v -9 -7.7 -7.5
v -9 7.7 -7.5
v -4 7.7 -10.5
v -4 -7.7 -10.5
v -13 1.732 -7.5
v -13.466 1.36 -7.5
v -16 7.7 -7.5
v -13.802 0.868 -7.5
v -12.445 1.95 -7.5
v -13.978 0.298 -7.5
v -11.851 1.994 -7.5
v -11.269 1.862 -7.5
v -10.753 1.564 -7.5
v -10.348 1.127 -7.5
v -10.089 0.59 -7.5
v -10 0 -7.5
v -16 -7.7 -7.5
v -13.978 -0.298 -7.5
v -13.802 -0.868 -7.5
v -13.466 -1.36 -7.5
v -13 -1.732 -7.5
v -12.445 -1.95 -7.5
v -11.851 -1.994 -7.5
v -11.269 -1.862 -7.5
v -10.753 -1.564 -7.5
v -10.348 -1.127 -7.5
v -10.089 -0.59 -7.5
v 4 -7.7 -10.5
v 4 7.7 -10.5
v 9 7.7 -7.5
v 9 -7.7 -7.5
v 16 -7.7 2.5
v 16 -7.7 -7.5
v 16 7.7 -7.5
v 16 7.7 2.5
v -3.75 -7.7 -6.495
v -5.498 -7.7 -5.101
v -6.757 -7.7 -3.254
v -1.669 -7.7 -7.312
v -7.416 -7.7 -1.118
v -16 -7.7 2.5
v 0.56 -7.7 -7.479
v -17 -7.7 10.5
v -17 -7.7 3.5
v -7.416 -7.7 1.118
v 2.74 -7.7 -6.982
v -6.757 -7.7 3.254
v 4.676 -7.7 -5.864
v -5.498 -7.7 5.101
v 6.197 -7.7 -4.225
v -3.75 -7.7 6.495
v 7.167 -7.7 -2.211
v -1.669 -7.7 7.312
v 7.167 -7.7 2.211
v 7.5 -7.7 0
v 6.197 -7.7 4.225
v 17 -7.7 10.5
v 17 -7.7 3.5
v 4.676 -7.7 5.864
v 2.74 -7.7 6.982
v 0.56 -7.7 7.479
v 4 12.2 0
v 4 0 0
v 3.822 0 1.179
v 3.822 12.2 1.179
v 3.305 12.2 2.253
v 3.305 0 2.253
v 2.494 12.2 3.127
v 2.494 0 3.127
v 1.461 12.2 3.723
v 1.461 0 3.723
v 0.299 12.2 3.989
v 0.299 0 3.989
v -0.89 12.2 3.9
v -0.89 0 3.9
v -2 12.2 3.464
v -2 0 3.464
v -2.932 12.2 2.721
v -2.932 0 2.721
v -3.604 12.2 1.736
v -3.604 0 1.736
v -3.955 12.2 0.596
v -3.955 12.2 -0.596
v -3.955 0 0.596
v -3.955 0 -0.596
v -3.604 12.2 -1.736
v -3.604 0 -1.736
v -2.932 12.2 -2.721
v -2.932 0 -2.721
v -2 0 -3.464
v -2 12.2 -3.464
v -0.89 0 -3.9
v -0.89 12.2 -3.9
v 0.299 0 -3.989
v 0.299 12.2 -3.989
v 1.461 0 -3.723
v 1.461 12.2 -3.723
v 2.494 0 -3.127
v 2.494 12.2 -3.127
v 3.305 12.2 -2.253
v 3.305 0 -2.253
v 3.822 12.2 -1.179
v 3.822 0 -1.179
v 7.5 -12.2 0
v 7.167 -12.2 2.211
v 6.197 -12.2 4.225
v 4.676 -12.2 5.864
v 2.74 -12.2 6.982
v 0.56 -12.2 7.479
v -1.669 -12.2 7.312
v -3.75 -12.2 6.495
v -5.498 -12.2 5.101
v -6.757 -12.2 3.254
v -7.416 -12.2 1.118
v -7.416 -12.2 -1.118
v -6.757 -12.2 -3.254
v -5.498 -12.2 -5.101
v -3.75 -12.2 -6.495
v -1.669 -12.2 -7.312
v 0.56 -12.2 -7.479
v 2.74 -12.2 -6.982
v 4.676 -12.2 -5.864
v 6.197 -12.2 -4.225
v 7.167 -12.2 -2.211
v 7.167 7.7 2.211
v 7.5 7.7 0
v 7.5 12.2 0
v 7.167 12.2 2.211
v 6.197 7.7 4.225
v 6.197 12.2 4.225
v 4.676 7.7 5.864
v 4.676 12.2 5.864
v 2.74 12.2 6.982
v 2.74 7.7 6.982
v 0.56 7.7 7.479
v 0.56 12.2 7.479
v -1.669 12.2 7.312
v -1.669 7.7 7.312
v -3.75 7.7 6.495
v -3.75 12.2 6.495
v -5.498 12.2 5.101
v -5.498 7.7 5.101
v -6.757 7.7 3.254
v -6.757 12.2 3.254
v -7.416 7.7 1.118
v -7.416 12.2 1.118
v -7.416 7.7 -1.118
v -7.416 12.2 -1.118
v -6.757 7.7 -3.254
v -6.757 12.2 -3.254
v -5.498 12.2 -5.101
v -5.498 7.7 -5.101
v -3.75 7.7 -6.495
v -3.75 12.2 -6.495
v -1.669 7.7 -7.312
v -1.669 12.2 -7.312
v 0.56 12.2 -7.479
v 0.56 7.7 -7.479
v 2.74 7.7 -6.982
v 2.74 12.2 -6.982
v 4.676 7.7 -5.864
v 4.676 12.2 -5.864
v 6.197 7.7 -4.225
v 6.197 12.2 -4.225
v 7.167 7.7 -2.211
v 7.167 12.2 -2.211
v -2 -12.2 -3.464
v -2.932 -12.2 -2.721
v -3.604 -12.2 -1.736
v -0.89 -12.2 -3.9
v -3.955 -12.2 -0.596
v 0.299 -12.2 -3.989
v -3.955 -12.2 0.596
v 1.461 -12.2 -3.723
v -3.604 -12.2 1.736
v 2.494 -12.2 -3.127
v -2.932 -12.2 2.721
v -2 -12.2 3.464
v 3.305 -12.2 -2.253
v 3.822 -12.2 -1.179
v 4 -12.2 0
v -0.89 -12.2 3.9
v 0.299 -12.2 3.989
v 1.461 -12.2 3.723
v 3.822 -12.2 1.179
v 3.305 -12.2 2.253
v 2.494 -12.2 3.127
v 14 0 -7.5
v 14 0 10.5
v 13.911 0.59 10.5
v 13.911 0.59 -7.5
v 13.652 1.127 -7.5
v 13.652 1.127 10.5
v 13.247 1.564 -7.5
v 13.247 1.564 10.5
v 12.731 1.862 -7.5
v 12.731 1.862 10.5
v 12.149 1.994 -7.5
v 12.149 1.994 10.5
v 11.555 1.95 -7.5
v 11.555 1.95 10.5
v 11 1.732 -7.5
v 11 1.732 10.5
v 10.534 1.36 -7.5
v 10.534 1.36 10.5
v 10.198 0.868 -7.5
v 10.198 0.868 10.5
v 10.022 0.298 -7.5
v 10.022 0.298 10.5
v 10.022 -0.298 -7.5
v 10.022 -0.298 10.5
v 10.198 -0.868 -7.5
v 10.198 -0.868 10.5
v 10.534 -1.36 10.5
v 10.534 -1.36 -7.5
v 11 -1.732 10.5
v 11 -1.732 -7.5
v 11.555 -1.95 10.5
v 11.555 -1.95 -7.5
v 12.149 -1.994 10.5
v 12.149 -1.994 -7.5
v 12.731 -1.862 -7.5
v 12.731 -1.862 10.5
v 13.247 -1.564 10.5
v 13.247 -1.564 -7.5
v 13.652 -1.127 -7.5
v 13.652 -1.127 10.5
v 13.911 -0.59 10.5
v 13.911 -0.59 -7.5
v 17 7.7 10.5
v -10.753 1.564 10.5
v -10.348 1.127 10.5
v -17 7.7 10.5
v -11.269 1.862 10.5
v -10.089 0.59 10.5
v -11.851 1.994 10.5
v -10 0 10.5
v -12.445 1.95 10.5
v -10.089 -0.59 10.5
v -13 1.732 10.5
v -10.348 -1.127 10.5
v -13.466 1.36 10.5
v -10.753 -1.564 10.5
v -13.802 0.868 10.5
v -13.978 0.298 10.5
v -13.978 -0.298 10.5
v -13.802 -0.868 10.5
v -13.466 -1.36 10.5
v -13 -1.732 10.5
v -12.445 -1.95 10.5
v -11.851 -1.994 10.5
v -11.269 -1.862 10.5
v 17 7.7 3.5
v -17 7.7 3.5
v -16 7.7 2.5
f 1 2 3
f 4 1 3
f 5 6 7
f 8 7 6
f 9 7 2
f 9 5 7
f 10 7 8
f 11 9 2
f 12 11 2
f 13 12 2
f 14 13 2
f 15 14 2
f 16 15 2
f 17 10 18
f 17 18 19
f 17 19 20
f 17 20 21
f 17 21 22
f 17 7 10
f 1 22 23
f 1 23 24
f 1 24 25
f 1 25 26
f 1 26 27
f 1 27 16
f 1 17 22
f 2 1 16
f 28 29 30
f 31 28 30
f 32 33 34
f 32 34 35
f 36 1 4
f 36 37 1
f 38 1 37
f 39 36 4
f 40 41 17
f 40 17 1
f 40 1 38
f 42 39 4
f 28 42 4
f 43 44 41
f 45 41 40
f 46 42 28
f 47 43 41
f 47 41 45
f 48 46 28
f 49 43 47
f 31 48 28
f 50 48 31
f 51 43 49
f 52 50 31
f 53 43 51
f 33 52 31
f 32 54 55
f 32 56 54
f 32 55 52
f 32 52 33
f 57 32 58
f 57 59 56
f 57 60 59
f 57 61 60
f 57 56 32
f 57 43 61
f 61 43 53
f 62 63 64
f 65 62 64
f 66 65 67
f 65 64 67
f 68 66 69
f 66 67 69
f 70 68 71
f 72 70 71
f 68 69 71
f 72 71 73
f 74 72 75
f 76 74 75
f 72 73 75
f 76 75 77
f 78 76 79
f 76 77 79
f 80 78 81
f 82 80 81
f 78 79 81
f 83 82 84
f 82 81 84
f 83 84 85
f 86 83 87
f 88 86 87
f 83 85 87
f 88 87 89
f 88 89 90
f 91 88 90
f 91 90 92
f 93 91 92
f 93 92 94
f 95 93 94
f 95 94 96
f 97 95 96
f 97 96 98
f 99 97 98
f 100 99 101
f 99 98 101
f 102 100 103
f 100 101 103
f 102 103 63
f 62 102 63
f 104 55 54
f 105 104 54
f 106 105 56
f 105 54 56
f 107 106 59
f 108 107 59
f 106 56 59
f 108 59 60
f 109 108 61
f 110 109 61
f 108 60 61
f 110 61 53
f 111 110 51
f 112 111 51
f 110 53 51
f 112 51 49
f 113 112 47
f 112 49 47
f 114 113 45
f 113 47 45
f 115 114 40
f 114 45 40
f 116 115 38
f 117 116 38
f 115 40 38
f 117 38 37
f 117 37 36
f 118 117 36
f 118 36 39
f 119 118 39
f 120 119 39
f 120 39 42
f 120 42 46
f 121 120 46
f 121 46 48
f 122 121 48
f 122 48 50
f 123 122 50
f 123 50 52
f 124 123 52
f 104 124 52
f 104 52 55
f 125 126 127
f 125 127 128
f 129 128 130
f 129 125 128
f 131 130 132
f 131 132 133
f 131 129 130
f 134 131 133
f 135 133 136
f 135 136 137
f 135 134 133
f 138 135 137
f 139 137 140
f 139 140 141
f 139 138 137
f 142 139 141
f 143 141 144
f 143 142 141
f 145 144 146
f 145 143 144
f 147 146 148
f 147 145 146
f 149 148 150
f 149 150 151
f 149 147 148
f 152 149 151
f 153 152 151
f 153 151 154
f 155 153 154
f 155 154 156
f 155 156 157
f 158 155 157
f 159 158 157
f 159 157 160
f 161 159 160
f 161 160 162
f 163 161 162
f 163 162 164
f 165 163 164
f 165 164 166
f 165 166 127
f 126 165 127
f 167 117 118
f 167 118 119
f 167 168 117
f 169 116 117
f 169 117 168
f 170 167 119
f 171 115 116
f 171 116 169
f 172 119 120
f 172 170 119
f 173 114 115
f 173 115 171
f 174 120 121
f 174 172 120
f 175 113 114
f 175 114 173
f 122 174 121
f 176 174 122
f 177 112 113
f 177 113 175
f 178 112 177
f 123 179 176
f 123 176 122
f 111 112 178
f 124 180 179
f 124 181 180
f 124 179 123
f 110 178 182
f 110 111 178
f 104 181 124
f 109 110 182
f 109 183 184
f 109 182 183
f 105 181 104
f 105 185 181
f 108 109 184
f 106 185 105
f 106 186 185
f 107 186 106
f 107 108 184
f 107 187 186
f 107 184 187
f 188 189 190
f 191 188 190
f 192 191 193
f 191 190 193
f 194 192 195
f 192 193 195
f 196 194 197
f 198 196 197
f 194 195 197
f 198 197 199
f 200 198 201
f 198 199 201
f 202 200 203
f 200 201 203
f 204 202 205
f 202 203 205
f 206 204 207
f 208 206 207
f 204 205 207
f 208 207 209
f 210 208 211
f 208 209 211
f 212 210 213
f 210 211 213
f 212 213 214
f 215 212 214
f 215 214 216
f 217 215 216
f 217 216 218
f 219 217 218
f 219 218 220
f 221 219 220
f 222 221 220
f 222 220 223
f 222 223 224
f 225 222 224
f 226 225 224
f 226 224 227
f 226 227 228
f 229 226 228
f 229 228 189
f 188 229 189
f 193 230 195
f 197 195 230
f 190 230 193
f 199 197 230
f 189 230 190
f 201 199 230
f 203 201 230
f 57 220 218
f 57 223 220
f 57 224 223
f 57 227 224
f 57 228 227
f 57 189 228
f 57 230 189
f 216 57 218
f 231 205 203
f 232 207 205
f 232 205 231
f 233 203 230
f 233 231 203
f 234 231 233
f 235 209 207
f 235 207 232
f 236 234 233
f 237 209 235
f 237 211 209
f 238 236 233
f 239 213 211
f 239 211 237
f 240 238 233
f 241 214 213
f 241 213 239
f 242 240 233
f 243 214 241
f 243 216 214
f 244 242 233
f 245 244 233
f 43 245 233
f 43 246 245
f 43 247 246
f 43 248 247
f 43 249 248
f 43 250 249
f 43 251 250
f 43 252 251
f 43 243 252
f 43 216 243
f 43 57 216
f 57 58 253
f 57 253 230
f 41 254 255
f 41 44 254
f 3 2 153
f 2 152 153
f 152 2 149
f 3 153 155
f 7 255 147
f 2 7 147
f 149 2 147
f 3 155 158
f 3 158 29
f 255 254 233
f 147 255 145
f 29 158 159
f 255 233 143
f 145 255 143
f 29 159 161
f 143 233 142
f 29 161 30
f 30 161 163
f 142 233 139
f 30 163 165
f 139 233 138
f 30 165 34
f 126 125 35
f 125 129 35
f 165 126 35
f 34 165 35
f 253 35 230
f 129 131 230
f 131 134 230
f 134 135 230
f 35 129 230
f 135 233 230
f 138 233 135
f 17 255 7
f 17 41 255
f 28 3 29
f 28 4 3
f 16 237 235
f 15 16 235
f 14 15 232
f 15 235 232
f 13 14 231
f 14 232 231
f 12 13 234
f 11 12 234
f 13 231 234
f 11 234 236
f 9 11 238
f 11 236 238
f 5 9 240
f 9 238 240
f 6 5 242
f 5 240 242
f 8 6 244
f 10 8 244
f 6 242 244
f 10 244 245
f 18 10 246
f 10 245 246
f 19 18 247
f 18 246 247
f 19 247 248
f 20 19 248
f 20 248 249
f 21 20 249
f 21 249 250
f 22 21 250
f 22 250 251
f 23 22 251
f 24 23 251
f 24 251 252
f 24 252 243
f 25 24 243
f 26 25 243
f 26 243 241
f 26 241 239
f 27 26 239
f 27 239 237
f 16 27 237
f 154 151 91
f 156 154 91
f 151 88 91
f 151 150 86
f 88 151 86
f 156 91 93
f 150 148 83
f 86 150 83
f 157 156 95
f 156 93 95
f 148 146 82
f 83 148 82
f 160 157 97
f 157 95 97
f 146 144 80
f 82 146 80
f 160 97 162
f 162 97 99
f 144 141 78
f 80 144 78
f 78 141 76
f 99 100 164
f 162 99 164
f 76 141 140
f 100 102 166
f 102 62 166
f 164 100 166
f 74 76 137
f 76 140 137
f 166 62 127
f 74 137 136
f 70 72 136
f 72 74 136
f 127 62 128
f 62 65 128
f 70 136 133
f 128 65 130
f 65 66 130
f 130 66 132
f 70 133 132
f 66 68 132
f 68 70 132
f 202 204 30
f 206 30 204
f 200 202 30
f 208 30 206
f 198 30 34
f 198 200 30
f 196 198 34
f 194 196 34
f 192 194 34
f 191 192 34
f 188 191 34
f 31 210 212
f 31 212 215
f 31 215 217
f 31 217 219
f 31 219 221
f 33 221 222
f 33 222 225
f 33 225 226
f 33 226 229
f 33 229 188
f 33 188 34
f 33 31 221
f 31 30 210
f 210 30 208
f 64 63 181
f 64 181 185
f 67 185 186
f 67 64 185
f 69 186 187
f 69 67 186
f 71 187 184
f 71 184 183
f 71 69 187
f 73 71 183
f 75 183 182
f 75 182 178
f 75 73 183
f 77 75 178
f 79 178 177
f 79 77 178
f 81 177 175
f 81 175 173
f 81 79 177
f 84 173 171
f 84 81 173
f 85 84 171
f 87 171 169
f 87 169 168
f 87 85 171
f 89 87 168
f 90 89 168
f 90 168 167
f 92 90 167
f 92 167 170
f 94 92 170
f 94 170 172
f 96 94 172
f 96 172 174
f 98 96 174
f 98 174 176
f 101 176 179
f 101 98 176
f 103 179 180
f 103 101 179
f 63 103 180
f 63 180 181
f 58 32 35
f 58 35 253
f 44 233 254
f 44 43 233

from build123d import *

# Parameters (mm, degrees)
F0_R          = 7.5
F1_DEPTH      = 7.7
F1_DEPTH_BACK = 7.7
F2_R          = 2
F3_DEPTH      = 25
F4_R          = 7.5
F4_R_2        = 4
F5_DEPTH      = 12.2
F5_DEPTH_BACK = 12.2


with BuildPart() as f1:
    # F0 (on Front) → F1 (new body, two sides)
    with BuildSketch(Plane.XZ) as f1_sk:
        Polygon((-4, -10.5), (4, -10.5), (9, -7.5), (16, -7.5), (16, 2.5), (17, 3.5), (17, 10.5), (-17, 10.5), (-17, 3.5), (-16, 2.5), (-16, -7.5), (-9, -7.5), align=None)
        Circle(F0_R, mode=Mode.SUBTRACT)
    extrude(amount=F1_DEPTH)
    extrude(f1_sk.sketch, amount=-F1_DEPTH_BACK)

    # F2 (on face) → F3 (cut)
    with BuildSketch(Plane.XY.offset(10.5)):
        with Locations((-12, 0)):
            Circle(F2_R)
        with Locations((12, 0)):
            Circle(F2_R)
    extrude(amount=-F3_DEPTH, mode=Mode.SUBTRACT)

    # F4 (on Front) → F5 (join, two sides)
    with BuildSketch(Plane.XZ) as f5_sk:
        Circle(F4_R)
        Circle(F4_R_2, mode=Mode.SUBTRACT)
    extrude(amount=F5_DEPTH)
    extrude(f5_sk.sketch, amount=-F5_DEPTH_BACK)


solid = f1.part
